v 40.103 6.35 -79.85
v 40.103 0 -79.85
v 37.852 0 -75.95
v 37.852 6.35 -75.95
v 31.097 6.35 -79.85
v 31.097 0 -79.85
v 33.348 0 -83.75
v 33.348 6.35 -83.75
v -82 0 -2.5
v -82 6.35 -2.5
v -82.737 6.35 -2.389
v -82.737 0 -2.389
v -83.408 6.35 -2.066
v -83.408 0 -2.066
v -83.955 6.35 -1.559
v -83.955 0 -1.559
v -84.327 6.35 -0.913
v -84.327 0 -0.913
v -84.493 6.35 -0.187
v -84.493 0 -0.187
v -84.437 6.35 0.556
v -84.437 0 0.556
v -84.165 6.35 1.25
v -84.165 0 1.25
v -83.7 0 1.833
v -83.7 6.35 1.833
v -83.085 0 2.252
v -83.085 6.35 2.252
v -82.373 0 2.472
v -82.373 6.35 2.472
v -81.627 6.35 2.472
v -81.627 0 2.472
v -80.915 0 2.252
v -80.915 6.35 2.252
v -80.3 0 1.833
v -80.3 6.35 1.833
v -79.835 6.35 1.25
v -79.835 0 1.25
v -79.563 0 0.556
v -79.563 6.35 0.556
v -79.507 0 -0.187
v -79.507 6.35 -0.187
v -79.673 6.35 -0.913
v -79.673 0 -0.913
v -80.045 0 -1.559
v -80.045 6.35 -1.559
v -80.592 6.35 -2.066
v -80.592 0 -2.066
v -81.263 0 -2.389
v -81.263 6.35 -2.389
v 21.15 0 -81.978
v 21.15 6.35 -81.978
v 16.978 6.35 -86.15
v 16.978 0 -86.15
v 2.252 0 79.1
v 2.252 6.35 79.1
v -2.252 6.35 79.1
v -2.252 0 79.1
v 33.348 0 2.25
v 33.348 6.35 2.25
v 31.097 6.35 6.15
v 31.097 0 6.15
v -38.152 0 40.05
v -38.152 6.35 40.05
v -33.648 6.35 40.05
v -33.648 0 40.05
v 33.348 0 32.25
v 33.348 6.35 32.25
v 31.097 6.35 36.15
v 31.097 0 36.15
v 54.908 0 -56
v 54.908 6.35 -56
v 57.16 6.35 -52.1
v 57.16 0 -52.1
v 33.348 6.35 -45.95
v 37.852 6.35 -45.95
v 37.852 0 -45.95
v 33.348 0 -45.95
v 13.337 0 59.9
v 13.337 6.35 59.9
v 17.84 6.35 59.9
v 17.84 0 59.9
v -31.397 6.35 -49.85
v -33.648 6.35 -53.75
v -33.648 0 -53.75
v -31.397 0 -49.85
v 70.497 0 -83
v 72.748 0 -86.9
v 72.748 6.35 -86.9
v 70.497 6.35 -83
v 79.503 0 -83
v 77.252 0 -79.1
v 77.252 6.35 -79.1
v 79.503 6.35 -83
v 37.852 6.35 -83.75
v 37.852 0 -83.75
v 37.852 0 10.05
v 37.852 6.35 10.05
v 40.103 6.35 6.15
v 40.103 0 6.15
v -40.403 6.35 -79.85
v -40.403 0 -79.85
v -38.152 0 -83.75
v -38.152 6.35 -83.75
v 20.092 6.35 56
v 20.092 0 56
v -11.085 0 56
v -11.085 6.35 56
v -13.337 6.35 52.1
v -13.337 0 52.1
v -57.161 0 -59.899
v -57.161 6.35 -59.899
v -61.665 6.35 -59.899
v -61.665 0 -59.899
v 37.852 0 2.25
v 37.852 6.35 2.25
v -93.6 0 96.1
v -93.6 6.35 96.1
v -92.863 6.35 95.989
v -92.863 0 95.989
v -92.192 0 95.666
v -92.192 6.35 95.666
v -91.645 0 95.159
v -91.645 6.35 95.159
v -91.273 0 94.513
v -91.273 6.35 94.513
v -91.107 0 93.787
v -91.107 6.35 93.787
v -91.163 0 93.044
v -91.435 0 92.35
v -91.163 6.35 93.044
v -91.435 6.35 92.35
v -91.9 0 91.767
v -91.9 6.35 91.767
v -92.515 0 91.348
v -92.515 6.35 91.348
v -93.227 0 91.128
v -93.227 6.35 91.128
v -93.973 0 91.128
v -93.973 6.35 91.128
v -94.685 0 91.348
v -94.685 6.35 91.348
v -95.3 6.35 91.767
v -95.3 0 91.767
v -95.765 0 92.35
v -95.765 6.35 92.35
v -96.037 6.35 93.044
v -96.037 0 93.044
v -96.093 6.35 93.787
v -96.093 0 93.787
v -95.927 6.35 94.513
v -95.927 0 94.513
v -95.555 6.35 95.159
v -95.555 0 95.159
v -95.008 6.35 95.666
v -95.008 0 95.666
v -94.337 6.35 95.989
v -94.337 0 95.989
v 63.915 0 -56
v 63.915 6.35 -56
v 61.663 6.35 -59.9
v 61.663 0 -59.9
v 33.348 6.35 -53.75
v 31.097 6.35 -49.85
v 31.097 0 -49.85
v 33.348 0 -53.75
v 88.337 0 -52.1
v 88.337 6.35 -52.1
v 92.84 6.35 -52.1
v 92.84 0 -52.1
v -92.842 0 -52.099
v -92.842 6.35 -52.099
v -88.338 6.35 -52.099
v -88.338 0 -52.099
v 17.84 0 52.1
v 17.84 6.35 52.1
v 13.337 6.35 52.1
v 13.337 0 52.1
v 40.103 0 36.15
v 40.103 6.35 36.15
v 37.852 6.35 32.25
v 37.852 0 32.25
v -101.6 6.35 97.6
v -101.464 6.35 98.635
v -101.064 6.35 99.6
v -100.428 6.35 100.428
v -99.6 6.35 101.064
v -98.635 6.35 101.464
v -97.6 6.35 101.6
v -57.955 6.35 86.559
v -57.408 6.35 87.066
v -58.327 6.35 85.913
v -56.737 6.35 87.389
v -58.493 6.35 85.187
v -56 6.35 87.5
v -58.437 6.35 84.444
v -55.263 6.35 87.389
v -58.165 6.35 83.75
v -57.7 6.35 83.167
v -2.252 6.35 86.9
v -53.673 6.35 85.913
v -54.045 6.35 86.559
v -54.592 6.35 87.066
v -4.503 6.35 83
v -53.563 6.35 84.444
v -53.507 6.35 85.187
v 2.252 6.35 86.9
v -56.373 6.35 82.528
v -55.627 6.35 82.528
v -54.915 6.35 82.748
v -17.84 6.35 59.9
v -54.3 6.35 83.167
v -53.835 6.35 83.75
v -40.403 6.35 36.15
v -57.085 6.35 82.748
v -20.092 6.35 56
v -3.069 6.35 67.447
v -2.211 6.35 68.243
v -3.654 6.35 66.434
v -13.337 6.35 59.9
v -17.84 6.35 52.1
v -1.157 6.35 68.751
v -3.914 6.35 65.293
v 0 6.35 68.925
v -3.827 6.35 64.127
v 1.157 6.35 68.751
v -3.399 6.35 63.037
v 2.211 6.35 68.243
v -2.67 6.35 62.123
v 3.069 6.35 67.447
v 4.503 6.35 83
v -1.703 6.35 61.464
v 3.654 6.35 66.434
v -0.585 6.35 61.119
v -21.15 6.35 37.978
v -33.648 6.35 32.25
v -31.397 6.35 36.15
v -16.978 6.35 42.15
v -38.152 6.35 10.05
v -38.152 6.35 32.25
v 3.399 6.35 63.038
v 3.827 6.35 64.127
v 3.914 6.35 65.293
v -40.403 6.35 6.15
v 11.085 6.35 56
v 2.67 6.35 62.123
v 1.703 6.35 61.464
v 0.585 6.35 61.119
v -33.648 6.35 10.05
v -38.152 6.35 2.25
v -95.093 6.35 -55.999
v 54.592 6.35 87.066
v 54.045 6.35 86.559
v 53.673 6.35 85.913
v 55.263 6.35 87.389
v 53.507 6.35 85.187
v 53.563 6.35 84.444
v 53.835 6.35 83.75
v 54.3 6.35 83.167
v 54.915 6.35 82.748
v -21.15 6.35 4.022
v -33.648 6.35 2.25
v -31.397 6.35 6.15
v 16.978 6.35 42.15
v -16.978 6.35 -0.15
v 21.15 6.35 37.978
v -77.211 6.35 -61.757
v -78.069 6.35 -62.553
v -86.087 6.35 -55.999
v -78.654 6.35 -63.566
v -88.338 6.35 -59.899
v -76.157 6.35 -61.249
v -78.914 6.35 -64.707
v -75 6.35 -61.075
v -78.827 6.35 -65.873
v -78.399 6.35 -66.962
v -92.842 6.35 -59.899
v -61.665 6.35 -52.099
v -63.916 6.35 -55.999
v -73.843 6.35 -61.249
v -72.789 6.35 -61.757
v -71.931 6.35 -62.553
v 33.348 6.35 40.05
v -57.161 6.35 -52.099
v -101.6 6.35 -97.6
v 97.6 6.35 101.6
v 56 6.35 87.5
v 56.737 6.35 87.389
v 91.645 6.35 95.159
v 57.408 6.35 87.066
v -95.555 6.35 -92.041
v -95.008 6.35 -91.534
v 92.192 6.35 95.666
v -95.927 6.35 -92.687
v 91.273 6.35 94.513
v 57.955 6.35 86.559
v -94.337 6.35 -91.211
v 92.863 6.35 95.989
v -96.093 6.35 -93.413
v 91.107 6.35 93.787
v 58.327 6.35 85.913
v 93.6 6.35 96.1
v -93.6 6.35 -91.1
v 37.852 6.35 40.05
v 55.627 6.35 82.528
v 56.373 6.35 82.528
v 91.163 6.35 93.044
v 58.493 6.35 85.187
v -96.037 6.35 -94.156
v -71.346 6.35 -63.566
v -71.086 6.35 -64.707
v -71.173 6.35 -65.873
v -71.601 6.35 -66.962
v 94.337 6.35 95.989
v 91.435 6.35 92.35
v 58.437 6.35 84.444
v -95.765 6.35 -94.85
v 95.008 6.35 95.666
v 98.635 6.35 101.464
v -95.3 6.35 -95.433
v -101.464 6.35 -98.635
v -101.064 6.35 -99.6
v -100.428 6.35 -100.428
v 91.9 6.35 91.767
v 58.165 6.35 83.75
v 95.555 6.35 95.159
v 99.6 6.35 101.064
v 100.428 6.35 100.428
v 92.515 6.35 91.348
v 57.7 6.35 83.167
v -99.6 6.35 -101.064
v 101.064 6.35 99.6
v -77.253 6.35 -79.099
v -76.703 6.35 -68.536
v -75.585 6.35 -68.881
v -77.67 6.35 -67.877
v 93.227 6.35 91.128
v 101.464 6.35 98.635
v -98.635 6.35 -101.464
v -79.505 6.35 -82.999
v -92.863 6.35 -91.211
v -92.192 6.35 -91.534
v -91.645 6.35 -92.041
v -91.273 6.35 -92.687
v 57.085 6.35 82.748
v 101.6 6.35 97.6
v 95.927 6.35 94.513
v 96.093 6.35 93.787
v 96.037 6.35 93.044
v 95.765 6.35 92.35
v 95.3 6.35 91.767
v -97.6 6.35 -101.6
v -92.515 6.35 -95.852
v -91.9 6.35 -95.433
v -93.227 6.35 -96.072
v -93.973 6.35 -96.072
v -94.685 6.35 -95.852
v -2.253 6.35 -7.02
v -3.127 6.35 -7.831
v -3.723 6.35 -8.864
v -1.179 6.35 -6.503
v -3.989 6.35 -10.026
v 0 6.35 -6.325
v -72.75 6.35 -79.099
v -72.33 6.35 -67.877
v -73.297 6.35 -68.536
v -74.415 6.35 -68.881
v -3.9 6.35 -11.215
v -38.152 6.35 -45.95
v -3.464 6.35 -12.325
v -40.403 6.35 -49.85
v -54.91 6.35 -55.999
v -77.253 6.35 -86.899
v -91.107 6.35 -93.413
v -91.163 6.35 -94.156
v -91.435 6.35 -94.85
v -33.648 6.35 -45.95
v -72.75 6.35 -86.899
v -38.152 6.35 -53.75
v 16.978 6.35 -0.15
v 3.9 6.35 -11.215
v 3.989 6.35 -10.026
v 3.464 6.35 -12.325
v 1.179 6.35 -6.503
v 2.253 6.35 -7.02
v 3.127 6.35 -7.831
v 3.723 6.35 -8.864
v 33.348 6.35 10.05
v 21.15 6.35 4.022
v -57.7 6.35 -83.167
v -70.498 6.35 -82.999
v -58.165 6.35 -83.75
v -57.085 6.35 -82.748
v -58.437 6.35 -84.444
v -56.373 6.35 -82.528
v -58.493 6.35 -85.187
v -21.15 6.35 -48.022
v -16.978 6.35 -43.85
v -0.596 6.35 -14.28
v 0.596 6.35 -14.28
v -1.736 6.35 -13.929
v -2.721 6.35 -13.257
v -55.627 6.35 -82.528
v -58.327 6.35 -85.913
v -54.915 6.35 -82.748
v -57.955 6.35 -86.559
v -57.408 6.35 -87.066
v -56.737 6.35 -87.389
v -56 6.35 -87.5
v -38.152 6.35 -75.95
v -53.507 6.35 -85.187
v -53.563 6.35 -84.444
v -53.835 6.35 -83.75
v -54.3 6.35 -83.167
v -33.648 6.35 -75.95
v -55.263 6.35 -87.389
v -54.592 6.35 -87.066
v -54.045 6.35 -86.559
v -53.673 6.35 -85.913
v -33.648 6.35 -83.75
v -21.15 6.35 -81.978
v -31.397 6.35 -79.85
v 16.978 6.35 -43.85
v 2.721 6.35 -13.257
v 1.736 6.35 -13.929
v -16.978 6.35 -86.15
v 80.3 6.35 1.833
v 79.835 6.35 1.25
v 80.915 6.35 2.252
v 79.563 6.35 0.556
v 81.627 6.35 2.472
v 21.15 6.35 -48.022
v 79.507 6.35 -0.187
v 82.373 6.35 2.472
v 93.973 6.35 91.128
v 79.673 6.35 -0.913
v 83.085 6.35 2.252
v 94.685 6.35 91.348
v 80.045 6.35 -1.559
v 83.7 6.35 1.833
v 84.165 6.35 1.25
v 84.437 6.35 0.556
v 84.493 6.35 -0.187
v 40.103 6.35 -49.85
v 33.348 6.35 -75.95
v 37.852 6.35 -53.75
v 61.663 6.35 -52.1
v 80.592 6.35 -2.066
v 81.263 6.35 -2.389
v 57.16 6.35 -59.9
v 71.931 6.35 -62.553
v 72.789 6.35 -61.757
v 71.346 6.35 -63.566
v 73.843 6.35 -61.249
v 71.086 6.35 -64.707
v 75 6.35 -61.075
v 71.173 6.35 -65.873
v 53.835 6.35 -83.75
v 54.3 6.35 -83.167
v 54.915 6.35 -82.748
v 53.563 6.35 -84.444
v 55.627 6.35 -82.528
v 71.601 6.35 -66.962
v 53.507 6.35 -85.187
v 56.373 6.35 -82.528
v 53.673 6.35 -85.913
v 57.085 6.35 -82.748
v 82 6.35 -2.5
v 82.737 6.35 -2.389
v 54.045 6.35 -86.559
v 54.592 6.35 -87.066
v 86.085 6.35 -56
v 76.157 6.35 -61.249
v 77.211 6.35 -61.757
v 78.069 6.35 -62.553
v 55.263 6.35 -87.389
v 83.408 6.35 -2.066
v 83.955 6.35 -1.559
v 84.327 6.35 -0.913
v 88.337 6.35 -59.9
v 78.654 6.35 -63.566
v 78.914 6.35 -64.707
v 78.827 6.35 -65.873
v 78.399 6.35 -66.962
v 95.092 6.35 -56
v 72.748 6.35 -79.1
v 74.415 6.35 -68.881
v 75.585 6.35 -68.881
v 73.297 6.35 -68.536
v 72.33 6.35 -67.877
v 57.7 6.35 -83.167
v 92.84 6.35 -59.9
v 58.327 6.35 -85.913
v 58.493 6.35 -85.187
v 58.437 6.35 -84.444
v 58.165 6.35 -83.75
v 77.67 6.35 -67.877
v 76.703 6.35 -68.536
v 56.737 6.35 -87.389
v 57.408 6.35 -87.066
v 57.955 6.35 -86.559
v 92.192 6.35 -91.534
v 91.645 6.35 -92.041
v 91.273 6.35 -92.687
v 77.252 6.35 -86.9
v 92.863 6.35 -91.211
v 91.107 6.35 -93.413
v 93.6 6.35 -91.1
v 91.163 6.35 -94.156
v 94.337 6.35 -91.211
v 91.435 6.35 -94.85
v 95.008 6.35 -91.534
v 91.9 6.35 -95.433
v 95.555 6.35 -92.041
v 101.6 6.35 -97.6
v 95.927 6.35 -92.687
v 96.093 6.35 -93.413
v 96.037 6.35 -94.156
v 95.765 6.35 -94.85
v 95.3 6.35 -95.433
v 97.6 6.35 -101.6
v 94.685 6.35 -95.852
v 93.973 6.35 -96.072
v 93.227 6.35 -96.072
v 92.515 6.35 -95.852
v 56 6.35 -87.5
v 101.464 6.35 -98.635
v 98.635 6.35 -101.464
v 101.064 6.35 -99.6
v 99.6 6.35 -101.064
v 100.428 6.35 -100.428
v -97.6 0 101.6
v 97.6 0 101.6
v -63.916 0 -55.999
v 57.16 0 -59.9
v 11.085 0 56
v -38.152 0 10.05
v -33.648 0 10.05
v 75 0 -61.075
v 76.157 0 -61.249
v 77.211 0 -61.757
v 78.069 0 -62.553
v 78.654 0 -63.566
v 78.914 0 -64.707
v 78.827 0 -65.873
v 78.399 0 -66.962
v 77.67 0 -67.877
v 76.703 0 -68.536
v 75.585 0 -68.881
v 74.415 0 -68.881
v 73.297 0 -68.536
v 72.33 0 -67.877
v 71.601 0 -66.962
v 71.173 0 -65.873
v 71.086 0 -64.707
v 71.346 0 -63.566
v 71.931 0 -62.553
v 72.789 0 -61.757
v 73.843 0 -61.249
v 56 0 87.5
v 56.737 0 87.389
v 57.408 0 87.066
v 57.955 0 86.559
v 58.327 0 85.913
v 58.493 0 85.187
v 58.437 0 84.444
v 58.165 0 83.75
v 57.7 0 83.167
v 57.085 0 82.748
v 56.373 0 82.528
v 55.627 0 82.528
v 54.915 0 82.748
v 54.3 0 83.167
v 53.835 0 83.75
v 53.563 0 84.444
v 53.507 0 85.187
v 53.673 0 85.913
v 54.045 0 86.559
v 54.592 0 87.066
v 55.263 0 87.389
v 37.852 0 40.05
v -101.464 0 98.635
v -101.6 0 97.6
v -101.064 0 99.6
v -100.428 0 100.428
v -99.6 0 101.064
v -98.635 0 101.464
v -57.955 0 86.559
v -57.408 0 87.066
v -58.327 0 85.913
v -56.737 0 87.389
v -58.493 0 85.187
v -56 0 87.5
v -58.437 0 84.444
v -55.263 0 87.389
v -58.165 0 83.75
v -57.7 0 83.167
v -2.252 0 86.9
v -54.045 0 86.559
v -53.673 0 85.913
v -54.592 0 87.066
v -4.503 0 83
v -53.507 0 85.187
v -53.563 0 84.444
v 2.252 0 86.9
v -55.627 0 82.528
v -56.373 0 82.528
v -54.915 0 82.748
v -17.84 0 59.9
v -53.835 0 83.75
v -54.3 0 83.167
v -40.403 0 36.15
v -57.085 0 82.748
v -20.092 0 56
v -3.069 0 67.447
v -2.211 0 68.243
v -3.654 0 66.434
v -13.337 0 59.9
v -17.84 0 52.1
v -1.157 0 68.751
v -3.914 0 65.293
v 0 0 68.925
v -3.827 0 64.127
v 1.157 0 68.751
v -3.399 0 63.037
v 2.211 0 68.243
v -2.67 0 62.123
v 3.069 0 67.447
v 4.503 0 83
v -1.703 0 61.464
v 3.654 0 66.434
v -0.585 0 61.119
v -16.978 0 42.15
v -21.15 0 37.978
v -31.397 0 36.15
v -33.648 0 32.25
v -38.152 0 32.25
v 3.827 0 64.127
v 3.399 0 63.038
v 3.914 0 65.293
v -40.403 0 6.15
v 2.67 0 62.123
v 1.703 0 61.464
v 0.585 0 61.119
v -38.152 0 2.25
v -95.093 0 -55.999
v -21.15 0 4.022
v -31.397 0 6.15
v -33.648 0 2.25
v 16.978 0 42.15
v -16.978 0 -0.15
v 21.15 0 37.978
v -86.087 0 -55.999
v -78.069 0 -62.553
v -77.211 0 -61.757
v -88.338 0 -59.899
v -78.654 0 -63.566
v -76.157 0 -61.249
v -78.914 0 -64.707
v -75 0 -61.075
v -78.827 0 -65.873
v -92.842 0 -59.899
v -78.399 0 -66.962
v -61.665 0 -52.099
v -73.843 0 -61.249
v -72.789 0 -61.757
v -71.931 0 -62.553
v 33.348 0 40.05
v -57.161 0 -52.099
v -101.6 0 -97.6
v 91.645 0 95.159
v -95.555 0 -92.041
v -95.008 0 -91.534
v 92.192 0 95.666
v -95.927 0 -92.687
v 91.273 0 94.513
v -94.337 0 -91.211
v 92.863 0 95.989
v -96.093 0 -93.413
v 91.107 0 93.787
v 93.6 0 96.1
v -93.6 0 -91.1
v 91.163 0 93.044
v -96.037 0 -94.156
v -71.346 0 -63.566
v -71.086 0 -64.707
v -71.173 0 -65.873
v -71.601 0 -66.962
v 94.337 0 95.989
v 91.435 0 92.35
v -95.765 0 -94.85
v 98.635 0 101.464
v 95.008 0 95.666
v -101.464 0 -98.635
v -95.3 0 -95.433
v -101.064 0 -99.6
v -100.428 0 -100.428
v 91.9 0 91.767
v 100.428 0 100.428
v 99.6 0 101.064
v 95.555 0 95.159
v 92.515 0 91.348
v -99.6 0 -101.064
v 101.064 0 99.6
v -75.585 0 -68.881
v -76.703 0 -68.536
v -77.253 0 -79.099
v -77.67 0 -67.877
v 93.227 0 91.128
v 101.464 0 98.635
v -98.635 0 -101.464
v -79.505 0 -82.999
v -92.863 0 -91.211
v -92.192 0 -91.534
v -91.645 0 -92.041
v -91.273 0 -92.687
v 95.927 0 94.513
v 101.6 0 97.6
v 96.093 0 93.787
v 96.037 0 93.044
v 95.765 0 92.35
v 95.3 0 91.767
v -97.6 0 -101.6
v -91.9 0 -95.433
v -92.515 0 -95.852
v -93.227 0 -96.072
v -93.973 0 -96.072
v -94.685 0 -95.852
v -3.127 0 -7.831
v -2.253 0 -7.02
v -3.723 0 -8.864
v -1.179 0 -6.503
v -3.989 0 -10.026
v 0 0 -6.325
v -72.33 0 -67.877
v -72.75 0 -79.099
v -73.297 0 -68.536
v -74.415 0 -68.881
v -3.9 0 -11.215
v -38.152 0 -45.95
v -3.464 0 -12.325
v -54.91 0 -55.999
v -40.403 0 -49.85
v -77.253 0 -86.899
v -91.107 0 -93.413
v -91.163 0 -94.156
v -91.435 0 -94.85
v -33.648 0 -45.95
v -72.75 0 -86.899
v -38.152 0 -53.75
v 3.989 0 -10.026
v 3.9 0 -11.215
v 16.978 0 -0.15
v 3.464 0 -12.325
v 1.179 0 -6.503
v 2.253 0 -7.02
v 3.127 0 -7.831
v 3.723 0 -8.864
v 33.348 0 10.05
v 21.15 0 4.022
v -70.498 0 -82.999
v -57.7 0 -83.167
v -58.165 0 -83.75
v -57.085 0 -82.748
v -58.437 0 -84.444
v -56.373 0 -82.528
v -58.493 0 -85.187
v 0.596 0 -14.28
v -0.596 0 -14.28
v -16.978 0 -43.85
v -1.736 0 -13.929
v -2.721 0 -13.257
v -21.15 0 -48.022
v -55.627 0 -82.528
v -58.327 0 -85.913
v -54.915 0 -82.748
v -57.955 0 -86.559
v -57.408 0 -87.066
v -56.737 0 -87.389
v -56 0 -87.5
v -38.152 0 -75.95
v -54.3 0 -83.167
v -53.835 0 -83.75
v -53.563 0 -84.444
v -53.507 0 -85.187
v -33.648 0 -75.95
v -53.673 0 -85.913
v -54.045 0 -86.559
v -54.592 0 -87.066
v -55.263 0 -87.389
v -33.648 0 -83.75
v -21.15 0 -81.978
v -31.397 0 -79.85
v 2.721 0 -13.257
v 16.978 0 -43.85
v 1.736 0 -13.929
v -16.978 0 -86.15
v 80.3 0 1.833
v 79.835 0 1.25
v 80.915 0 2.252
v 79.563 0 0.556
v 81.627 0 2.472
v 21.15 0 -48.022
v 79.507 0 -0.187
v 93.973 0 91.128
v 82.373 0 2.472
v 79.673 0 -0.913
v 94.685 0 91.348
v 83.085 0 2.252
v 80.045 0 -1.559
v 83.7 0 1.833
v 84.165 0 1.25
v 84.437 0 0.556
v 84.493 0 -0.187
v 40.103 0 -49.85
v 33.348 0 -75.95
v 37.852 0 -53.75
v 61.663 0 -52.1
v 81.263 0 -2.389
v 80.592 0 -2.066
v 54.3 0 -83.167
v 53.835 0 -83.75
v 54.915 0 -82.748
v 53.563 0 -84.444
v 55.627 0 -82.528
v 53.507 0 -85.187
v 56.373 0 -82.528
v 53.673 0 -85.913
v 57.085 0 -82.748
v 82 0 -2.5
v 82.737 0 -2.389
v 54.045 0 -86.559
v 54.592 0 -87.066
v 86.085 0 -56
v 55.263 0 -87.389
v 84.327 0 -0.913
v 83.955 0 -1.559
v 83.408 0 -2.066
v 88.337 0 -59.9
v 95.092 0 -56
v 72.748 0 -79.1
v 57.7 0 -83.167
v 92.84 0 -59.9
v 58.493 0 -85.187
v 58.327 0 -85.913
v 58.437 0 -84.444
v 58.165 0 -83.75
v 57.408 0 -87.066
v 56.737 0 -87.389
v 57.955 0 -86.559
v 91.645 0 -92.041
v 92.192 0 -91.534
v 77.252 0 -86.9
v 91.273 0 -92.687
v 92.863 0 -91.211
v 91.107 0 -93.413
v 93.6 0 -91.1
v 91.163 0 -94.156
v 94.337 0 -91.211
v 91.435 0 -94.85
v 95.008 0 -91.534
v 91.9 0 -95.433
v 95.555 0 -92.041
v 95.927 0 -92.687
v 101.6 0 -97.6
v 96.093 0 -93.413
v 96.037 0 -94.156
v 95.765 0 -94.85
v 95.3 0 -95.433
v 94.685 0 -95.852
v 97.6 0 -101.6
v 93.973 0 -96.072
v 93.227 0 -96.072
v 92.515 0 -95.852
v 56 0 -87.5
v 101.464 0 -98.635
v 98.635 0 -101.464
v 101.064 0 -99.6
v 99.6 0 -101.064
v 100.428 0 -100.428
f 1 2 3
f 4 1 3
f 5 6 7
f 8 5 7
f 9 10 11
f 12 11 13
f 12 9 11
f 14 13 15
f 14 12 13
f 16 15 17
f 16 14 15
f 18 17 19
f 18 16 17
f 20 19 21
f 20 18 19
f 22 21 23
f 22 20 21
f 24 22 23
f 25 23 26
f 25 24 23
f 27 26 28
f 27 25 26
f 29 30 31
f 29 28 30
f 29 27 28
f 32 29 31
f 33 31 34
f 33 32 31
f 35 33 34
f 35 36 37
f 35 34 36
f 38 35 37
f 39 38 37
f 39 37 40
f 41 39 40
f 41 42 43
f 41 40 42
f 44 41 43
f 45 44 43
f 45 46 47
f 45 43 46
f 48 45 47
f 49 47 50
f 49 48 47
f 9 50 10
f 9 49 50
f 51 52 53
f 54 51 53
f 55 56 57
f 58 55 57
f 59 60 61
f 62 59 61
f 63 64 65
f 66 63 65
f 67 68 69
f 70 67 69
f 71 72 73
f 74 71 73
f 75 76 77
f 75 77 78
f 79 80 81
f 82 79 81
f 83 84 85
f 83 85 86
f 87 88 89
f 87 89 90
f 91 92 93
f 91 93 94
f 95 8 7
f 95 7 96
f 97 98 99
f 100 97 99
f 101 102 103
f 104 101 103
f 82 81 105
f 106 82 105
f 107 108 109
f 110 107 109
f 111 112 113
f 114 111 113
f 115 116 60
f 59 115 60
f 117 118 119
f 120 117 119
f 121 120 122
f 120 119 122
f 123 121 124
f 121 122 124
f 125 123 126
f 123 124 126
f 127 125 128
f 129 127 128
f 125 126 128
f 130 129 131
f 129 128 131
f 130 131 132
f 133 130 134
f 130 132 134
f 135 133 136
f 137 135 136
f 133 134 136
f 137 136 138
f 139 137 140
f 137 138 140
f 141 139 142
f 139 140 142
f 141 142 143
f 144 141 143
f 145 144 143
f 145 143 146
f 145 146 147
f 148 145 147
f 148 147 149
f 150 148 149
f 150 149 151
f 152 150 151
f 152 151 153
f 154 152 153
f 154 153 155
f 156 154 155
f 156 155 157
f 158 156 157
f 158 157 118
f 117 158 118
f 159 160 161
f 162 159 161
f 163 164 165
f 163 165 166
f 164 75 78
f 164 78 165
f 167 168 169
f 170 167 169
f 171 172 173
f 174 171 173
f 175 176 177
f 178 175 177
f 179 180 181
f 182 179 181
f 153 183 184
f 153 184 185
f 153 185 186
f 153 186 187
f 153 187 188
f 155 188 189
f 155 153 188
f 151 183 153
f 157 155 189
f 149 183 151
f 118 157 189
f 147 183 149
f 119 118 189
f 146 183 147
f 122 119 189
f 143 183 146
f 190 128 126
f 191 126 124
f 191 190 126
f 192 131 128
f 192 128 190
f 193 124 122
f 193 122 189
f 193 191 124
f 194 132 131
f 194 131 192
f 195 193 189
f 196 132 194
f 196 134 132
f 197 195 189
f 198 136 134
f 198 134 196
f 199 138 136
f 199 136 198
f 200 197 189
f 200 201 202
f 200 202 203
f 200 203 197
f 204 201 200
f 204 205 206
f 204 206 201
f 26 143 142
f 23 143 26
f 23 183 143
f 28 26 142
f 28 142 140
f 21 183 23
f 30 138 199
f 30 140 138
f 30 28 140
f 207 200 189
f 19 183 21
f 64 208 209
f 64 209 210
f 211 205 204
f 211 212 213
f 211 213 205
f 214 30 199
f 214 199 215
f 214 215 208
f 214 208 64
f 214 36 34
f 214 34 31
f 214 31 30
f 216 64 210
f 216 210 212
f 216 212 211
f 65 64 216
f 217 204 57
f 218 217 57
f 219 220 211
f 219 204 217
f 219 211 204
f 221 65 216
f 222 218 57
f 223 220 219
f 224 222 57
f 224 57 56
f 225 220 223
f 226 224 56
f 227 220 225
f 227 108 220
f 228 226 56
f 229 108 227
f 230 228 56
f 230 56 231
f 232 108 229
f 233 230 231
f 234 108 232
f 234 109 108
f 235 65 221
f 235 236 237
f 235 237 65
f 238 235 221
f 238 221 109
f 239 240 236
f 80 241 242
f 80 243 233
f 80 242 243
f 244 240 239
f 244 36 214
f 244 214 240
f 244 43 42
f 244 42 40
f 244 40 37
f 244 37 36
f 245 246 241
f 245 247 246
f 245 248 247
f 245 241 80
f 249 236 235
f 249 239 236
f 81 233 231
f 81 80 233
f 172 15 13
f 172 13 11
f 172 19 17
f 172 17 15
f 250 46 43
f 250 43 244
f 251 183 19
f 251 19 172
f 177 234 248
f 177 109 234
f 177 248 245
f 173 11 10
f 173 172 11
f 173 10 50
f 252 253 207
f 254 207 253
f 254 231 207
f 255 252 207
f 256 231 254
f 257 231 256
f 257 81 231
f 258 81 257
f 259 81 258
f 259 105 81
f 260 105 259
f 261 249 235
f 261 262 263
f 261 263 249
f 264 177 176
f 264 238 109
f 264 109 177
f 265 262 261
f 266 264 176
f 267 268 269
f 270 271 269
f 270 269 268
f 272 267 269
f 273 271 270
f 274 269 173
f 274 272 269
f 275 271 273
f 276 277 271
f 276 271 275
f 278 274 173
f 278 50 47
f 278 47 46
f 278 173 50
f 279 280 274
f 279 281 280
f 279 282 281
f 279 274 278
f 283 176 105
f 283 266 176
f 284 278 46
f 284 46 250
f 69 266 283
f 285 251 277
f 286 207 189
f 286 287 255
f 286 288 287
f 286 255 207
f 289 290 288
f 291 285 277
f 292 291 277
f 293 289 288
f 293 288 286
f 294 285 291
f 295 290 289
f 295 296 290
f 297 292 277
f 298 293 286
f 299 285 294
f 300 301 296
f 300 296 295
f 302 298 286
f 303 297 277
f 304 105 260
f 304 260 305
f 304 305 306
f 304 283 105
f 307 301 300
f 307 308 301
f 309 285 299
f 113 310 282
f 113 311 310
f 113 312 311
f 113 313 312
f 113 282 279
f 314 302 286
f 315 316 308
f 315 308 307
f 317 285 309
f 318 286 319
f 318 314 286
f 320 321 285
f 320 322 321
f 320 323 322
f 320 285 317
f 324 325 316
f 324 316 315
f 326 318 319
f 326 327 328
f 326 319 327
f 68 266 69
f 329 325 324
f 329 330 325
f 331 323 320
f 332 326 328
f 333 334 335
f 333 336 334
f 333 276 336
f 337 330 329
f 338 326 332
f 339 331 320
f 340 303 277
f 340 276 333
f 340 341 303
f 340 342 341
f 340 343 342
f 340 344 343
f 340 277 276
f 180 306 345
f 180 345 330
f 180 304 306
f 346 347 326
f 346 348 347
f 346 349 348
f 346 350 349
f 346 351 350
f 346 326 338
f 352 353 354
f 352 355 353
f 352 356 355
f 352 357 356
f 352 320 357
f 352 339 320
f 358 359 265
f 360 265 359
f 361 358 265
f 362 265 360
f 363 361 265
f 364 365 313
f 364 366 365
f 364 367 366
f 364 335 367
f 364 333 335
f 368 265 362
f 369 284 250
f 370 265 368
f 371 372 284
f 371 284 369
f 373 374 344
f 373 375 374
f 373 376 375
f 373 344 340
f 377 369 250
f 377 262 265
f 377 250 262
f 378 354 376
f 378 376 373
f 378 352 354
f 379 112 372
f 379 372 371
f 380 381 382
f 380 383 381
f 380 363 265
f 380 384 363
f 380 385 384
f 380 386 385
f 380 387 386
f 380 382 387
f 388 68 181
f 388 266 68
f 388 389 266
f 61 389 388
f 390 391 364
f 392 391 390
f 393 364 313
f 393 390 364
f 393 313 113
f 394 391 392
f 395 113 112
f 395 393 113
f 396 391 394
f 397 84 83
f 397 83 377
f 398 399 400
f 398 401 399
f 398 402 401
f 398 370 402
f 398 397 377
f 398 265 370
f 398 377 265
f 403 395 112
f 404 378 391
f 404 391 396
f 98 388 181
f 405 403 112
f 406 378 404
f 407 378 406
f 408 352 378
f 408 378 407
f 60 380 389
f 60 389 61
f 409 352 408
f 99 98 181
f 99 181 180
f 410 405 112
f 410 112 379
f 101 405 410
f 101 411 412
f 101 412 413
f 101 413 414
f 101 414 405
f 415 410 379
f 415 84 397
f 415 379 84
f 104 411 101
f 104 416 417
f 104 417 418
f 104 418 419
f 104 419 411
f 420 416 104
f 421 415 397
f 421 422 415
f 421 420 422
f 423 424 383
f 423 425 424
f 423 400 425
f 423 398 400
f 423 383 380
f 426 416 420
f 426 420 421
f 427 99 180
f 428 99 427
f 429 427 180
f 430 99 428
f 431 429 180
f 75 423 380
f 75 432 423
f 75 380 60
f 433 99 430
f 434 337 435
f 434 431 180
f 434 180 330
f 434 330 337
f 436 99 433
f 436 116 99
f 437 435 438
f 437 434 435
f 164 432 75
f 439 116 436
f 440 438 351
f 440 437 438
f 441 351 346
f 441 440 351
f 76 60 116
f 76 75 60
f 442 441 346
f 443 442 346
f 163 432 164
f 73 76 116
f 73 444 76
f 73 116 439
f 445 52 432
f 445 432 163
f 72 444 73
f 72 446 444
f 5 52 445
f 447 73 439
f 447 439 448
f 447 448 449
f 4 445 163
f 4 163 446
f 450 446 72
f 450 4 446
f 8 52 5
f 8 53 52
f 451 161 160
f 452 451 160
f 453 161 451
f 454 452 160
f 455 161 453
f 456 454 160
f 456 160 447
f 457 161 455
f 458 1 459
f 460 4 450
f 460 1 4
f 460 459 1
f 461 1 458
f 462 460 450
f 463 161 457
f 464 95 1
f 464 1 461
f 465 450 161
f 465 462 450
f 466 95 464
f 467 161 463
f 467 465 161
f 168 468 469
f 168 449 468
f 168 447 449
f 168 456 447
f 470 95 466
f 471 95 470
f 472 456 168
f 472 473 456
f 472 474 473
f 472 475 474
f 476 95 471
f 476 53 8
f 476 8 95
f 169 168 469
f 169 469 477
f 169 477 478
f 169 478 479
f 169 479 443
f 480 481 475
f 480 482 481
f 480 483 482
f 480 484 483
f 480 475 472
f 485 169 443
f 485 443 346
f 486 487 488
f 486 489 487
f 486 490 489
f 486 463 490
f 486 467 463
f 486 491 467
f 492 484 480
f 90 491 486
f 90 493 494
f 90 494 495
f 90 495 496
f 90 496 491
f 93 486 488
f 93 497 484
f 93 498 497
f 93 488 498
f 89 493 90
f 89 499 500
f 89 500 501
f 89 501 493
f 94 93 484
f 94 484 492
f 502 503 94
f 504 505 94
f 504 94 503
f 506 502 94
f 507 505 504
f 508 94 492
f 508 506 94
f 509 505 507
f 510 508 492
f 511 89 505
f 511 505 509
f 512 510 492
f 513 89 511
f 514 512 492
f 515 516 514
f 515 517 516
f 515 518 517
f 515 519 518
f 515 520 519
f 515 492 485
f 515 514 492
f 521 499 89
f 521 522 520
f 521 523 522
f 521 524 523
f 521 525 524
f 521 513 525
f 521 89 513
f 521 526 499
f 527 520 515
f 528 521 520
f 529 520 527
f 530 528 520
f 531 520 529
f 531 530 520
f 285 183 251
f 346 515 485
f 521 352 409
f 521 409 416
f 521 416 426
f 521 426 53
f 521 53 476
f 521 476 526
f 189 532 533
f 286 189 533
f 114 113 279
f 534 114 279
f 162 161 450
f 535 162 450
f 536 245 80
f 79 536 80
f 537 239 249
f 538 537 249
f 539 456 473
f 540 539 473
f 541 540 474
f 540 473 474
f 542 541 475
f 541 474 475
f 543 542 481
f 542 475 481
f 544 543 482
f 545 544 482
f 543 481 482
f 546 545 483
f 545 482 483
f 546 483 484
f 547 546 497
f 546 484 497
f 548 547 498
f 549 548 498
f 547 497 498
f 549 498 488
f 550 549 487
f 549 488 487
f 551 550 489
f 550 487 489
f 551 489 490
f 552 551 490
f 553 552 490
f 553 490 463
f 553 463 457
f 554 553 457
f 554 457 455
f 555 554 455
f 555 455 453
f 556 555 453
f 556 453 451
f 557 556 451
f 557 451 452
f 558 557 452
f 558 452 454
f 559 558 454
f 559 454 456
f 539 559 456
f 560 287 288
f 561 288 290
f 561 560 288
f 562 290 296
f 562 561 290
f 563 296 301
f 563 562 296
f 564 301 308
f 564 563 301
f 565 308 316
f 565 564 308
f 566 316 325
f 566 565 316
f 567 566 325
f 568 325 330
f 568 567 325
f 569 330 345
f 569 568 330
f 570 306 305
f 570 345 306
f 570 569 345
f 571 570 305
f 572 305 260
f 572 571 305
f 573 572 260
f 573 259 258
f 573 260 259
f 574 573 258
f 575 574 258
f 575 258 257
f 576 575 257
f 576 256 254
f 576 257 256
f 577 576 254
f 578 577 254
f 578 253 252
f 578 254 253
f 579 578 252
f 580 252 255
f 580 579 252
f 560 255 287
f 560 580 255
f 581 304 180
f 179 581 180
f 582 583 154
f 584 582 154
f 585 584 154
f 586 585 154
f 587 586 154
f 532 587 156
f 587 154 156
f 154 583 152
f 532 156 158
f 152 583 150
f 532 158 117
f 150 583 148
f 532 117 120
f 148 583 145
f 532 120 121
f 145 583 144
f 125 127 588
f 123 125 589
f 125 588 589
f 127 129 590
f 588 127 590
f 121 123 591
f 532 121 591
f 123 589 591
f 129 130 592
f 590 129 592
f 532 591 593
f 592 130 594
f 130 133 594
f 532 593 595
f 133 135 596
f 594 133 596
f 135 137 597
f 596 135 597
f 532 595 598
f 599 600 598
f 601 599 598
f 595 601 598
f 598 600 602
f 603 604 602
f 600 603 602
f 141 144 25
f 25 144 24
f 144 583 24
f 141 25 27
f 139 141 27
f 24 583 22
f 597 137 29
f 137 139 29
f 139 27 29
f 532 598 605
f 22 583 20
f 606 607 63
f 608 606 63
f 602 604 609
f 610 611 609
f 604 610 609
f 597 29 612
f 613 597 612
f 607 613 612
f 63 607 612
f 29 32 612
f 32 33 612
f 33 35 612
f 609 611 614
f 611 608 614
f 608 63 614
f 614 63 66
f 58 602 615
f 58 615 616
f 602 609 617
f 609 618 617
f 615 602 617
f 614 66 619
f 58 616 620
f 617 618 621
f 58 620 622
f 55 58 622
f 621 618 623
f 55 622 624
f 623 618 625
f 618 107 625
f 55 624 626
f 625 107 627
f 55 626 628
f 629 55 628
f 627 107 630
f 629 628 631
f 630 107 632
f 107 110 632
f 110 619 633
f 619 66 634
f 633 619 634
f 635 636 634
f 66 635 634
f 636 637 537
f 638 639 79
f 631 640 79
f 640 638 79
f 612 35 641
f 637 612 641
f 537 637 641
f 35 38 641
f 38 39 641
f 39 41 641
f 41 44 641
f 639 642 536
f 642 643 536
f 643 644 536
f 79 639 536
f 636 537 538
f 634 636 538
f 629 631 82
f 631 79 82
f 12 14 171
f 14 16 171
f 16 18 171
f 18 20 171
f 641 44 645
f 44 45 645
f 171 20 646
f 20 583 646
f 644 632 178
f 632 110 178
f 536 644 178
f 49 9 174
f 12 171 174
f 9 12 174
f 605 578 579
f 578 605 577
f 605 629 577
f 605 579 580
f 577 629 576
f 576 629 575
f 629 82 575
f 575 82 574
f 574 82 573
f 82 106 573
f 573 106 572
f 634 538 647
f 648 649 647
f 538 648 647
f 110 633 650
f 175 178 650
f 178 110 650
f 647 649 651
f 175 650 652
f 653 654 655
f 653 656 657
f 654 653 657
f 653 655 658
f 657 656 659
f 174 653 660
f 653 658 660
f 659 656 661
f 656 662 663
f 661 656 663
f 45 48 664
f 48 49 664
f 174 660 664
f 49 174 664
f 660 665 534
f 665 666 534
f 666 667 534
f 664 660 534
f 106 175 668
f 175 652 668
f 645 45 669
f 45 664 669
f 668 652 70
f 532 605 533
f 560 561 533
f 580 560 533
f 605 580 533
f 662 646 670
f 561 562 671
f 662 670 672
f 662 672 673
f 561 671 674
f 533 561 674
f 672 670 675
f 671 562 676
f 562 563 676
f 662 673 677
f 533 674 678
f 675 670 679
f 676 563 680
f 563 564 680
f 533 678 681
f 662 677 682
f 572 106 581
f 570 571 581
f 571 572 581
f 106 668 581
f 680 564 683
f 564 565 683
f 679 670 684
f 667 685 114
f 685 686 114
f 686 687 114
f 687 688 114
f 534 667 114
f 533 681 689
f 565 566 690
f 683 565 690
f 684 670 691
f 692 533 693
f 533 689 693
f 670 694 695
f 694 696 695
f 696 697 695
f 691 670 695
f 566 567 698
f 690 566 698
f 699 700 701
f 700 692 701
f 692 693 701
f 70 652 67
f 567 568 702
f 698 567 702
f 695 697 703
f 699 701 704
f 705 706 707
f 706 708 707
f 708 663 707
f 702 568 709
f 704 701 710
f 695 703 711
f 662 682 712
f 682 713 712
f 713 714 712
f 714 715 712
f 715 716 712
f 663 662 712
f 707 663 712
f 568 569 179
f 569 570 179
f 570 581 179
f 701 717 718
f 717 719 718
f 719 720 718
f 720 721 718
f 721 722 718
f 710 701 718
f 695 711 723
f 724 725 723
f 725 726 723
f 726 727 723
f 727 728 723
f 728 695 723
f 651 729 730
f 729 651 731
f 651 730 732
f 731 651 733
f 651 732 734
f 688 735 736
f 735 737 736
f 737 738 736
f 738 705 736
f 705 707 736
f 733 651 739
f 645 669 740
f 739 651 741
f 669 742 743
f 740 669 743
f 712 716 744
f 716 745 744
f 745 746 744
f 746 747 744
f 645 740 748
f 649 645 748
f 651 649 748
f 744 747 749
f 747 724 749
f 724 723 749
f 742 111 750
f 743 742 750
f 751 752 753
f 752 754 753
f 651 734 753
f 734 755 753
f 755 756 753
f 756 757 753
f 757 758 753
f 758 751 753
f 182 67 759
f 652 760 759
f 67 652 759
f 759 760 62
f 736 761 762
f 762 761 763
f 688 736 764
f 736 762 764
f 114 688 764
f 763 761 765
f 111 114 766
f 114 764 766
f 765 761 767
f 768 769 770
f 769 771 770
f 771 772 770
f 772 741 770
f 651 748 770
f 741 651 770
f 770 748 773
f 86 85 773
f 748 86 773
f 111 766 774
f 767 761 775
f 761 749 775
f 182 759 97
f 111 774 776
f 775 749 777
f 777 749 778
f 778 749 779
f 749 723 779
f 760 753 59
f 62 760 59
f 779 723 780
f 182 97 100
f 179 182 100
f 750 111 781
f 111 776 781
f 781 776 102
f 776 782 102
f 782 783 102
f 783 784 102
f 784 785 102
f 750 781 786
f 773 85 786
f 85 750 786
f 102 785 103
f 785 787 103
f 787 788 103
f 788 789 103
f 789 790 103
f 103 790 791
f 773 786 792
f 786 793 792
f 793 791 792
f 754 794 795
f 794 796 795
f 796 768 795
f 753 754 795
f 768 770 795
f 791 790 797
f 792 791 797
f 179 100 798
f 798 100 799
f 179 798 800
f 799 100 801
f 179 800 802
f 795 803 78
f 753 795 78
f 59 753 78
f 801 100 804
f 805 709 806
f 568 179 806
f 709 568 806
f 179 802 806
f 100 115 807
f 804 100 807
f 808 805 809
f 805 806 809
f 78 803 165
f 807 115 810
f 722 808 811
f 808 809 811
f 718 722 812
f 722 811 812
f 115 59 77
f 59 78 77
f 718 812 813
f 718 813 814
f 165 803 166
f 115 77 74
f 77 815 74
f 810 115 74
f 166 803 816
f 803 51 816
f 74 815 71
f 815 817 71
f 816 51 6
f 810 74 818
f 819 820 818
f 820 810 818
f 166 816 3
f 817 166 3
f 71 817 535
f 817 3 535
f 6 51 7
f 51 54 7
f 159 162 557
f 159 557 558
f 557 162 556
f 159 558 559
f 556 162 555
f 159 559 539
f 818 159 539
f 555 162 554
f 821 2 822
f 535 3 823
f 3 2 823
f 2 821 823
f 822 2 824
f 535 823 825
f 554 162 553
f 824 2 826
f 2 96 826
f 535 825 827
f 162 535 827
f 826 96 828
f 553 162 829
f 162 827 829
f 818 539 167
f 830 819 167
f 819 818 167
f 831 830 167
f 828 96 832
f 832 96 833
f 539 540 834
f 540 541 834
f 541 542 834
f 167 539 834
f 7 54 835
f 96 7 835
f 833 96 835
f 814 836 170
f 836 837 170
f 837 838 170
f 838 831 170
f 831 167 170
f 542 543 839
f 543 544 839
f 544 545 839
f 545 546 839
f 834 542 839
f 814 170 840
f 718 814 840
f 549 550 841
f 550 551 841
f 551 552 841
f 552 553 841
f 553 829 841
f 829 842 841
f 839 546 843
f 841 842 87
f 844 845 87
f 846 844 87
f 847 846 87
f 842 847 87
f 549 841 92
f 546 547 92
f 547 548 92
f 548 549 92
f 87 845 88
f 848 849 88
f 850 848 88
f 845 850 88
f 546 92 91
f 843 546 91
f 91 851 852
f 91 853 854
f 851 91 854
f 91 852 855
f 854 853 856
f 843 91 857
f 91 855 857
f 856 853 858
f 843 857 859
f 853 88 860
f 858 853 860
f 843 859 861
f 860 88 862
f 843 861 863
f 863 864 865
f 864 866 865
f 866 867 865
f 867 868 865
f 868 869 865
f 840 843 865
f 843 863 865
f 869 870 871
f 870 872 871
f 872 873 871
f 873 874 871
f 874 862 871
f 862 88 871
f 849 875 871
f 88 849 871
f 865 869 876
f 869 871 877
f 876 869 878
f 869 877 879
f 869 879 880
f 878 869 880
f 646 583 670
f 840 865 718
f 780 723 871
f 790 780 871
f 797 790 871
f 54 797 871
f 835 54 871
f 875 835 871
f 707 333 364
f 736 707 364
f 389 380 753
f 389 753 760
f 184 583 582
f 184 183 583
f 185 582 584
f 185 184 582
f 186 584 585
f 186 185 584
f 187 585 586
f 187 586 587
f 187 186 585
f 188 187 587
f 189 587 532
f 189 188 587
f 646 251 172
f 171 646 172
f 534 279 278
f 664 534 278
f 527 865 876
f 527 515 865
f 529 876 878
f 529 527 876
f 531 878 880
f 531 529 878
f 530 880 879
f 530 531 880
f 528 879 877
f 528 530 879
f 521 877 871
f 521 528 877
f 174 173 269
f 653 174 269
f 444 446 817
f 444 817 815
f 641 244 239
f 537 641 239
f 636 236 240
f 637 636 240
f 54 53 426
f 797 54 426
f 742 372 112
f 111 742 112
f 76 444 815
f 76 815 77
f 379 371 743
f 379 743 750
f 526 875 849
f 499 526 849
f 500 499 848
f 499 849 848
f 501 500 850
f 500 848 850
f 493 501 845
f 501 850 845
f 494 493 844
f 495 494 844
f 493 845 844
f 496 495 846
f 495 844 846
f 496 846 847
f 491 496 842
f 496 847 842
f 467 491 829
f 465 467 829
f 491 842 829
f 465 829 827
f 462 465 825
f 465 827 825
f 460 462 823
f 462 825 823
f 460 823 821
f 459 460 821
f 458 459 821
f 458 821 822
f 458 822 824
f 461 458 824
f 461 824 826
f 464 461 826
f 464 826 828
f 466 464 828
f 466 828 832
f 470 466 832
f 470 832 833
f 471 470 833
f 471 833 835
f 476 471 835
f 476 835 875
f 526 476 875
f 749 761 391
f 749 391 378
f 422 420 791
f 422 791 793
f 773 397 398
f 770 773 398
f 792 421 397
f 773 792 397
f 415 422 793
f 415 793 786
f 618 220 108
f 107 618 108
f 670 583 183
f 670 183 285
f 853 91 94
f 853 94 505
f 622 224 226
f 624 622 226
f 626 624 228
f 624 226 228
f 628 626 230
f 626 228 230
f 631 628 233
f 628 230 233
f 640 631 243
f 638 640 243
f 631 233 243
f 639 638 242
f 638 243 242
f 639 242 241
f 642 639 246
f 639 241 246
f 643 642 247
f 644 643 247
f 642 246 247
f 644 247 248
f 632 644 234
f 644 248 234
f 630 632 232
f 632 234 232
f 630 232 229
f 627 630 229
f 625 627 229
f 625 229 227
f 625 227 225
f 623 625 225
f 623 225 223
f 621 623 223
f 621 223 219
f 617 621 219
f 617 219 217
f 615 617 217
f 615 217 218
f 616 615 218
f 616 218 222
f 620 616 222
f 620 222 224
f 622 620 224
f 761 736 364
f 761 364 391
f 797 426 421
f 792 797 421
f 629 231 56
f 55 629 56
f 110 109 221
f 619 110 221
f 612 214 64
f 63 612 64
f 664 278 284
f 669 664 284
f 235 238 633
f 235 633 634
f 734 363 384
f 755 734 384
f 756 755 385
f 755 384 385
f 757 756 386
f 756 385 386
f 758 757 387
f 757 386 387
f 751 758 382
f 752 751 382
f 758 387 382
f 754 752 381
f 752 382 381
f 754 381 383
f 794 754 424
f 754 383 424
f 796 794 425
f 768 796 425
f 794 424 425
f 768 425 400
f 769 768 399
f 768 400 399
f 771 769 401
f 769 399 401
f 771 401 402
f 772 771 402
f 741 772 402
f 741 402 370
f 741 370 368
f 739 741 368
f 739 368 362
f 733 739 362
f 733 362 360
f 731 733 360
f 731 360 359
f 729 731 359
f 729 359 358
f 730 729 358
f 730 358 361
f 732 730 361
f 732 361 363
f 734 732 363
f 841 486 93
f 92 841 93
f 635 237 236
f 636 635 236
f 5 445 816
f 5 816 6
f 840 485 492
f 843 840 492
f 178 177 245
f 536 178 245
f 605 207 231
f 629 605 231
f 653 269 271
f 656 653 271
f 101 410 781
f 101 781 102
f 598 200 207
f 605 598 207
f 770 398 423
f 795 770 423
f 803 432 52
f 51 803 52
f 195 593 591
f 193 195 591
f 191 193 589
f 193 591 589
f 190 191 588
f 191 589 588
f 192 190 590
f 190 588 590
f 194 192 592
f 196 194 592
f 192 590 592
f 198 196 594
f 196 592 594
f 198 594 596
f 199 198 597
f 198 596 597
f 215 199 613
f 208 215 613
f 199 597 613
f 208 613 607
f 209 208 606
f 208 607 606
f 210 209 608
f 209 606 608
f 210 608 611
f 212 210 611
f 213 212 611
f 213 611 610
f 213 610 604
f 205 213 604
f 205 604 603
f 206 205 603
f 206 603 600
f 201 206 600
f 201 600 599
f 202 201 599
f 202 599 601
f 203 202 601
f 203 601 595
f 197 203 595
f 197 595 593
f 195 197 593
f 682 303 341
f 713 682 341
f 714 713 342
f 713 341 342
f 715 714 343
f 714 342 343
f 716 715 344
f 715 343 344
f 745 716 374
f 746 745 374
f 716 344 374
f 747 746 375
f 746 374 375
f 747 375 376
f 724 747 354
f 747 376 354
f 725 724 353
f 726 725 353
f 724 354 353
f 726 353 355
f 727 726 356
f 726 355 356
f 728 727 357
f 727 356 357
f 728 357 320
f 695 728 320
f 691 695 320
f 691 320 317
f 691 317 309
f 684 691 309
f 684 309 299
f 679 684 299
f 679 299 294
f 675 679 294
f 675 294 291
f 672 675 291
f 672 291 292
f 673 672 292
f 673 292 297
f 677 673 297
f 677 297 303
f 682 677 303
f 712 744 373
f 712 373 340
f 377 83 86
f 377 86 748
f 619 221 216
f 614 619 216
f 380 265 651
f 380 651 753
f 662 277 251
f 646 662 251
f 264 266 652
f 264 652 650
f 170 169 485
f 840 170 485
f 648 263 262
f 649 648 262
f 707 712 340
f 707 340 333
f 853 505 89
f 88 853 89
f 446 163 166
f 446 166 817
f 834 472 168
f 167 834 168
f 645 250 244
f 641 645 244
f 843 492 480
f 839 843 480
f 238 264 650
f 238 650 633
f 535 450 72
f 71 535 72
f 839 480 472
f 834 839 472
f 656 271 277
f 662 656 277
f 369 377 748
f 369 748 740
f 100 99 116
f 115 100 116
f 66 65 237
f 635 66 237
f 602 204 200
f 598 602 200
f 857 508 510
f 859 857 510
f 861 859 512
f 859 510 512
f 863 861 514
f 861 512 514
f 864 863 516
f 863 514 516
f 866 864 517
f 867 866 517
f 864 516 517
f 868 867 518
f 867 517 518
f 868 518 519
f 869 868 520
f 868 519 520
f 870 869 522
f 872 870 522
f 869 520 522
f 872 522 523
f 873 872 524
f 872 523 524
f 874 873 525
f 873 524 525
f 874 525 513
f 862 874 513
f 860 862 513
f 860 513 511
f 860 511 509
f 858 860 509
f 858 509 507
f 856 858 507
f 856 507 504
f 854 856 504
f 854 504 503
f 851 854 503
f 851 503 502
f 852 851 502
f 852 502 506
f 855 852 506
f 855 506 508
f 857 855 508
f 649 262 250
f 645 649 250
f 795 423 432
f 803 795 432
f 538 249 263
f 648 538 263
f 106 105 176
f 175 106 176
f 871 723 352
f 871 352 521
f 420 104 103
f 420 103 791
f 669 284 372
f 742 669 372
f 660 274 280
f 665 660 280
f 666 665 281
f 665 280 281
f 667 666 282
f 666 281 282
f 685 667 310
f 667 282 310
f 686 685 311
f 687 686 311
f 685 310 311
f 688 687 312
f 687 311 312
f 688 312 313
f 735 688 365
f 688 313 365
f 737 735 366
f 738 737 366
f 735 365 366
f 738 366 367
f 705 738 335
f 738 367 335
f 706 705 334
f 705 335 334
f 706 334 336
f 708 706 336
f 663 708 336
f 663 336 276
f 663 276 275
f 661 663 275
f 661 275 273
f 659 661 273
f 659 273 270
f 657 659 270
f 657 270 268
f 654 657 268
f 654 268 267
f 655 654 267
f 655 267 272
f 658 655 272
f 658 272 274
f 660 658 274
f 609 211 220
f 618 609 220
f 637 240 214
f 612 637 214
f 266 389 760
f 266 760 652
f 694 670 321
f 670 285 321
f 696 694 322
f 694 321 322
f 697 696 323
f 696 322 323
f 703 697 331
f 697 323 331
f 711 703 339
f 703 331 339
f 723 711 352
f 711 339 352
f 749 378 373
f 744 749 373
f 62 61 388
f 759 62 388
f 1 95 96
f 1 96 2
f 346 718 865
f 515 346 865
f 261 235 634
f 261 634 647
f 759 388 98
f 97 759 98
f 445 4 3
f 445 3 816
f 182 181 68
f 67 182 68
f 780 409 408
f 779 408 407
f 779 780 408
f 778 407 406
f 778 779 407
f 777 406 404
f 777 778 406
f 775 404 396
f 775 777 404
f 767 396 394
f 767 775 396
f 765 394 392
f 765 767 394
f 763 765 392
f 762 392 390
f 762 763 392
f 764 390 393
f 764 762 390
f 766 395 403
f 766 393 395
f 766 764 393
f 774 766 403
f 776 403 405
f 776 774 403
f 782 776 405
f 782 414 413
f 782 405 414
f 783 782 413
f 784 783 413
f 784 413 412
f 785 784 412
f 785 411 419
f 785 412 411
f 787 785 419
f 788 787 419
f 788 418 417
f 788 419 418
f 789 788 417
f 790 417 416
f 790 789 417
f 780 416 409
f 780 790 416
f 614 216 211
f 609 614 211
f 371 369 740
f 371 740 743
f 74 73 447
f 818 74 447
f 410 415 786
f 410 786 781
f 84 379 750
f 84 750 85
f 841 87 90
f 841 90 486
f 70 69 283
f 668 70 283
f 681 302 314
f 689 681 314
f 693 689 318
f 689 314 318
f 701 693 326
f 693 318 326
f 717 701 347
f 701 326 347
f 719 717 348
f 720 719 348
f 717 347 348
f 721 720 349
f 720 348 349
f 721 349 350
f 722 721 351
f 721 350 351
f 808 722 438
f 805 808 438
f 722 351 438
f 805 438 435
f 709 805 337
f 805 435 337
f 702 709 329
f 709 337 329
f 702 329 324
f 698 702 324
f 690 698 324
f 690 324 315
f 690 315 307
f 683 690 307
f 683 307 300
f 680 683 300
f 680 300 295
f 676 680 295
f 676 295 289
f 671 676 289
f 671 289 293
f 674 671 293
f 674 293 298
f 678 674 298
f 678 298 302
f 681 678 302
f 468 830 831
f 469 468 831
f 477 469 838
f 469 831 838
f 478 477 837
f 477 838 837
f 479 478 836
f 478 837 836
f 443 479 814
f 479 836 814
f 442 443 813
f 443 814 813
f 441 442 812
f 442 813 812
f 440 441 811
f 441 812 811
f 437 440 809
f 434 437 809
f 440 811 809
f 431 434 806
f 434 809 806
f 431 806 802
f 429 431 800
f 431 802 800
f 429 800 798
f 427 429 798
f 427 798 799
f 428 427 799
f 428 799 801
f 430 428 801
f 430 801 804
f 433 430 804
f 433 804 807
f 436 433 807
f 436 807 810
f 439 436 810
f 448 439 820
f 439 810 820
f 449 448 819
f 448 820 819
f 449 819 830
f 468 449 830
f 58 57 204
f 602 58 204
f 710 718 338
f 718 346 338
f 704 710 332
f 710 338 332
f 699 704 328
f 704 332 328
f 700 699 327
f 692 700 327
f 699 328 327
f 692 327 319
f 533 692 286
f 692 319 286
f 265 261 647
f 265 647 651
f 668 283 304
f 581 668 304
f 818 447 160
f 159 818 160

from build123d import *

# Parameters (mm, degrees)
ESQUISSE1_W               = 203.2
ESQUISSE1_H               = 203.2
BOSS_EXTRU_1_DEPTH        = 6.35
ESQUISSE2_R               = 3.925
ENL_V_MAT_EXTRU_1_DEPTH   = 144.824345992
ENL_V_MAT_EXTRU_2_DEPTH   = 144.824345992
ENL_V_MAT_EXTRU_5_DEPTH   = 144.824345992
ENL_V_MAT_EXTRU_6_DEPTH   = 144.824345992
ENL_V_MAT_EXTRU_7_DEPTH   = 144.824345992
ENL_V_MAT_EXTRU_8_DEPTH   = 144.824345992
ENL_V_MAT_EXTRU_9_DEPTH   = 144.824345992
ESQUISSE11_R              = 2.5
ENL_V_MAT_EXTRU_10_DEPTH  = 144.824345992
ESQUISSE12_R              = 4
ENL_V_MAT_EXTRU_11_DEPTH  = 144.824345992
ESQUISSE13_R              = 2.5
ENL_V_MAT_EXTRU_12_DEPTH  = 144.824345992
SYM_TRIE2_COPY_1_SKETCH_R = 2.5
SYM_TRIE2_COPY_1_DEPTH    = 144.824345992
CONG_3_R                  = 4
ENL_V_MAT_EXTRU_13_DEPTH  = 144.824345992
ESQUISSE15_R              = 2.6
ENL_V_MAT_EXTRU_14_DEPTH  = 144.824345992
ENL_V_MAT_EXTRU_15_DEPTH  = 144.824345992


with BuildPart() as part:
    # Esquisse1 → Boss.-Extru.1 (new body)
    with BuildSketch(Plane(origin=(0, 0, 0), x_dir=(1, 0, 0), z_dir=(0, 1, 0))):
        Rectangle(ESQUISSE1_W, ESQUISSE1_H)
    extrude(amount=BOSS_EXTRU_1_DEPTH)

    # Esquisse2 → Enlèv. mat.-Extru.1 (cut, through all)
    with BuildSketch(Plane(origin=(0, 6.35, 0), x_dir=(1, 0, 0), z_dir=(0, 1, 0))):
        with Locations(Location((-75, 65, 0), (0, 0, 270))):
            Circle(ESQUISSE2_R)
        with Locations(Location((75, 65, 0), (0, 0, 270))):
            Circle(ESQUISSE2_R)
        with Locations(Location((0, -65, 0), (0, 0, 270))):
            Circle(ESQUISSE2_R)
    extrude(amount=-ENL_V_MAT_EXTRU_1_DEPTH, mode=Mode.SUBTRACT)

    # Esquisse3 → Enlèv. mat.-Extru.2 (cut, through all)
    with BuildSketch(Plane(origin=(0, 6.35, 0), x_dir=(1, 0, 0), z_dir=(0, 1, 0))):
        Polygon((-16.978069991, 86.15), (-21.15, 81.978069991), (-21.15, 48.021930009), (-16.978069991, 43.85), (16.978069991, 43.85), (21.15, 48.021930009), (21.15, 81.978069991), (16.978069991, 86.15), align=None)
    extrude(amount=-ENL_V_MAT_EXTRU_2_DEPTH, mode=Mode.SUBTRACT)

    # Esquisse5 → Enlèv. mat.-Extru.5 (cut, through all)
    with BuildSketch(Plane(origin=(0, 6.35, 0), x_dir=(1, 0, 0), z_dir=(0, 1, 0))):
        Polygon((-31.3966679, 49.85), (-33.64833395, 45.95), (-38.15166605, 45.95), (-40.4033321, 49.85), (-38.15166605, 53.75), (-33.64833395, 53.75), align=None)
    extrude(amount=-ENL_V_MAT_EXTRU_5_DEPTH, mode=Mode.SUBTRACT)

    # Esquisse7 → Enlèv. mat.-Extru.6 (cut, through all)
    with BuildSketch(Plane(origin=(0, 6.35, 0), x_dir=(1, 0, 0), z_dir=(0, 1, 0))):
        Polygon((-33.64833395, 75.95), (-38.15166605, 75.95), (-40.4033321, 79.85), (-38.15166605, 83.75), (-33.64833395, 83.75), (-31.3966679, 79.85), align=None)
    extrude(amount=-ENL_V_MAT_EXTRU_6_DEPTH, mode=Mode.SUBTRACT)

    # Esquisse8 → Enlèv. mat.-Extru.7 (cut, through all)
    with BuildSketch(Plane(origin=(0, 6.35, 0), x_dir=(1, 0, 0), z_dir=(0, 1, 0))):
        Polygon((37.85166605, 45.95), (33.34833395, 45.95), (31.0966679, 49.85), (33.34833395, 53.75), (37.85166605, 53.75), (40.1033321, 49.85), align=None)
    extrude(amount=-ENL_V_MAT_EXTRU_7_DEPTH, mode=Mode.SUBTRACT)

    # Esquisse9 → Enlèv. mat.-Extru.8 (cut, through all)
    with BuildSketch(Plane(origin=(0, 6.35, 0), x_dir=(1, 0, 0), z_dir=(0, 1, 0))):
        Polygon((37.85166605, 75.95), (33.34833395, 75.95), (31.0966679, 79.85), (33.34833395, 83.75), (37.85166605, 83.75), (40.1033321, 79.85), align=None)
    extrude(amount=-ENL_V_MAT_EXTRU_8_DEPTH, mode=Mode.SUBTRACT)

    # Esquisse10 → Enlèv. mat.-Extru.9 (cut, through all)
    with BuildSketch(Plane(origin=(0, 6.35, 0), x_dir=(1, 0, 0), z_dir=(0, 1, 0))):
        Polygon((-11.085125168, -56), (-13.336791218, -52.1), (-17.840123318, -52.1), (-20.091789368, -56), (-17.840123318, -59.9), (-13.336791218, -59.9), align=None)
        Polygon((11.085125168, -56), (13.336791218, -59.9), (17.840123318, -59.9), (20.091789368, -56), (17.840123318, -52.1), (13.336791218, -52.1), align=None)
        Polygon((-4.5033321, -83), (-2.25166605, -86.9), (2.25166605, -86.9), (4.5033321, -83), (2.25166605, -79.1), (-2.25166605, -79.1), align=None)
        Polygon((-63.916340686, 55.999154304), (-61.664674636, 52.099154304), (-57.161342537, 52.099154304), (-54.909676487, 55.999154304), (-57.161342537, 59.899154304), (-61.664674636, 59.899154304), align=None)
        Polygon((-95.093255222, 55.999154304), (-92.841589173, 52.099154304), (-88.338257073, 52.099154304), (-86.086591023, 55.999154304), (-88.338257073, 59.899154304), (-92.841589173, 59.899154304), align=None)
        Polygon((-79.504797954, 82.999154304), (-77.253131904, 79.099154304), (-72.749799805, 79.099154304), (-70.498133755, 82.999154304), (-72.749799805, 86.899154304), (-77.253131904, 86.899154304), align=None)
        Polygon((54.908210632, 56), (57.159876682, 52.1), (61.663208782, 52.1), (63.914874832, 56), (61.663208782, 59.9), (57.159876682, 59.9), align=None)
        Polygon((95.091789368, 56), (92.840123318, 59.9), (88.336791218, 59.9), (86.085125168, 56), (88.336791218, 52.1), (92.840123318, 52.1), align=None)
        Polygon((70.4966679, 83), (72.74833395, 79.1), (77.25166605, 79.1), (79.5033321, 83), (77.25166605, 86.9), (72.74833395, 86.9), align=None)
    extrude(amount=-ENL_V_MAT_EXTRU_9_DEPTH, mode=Mode.SUBTRACT)

    # Esquisse11 → Enlèv. mat.-Extru.10 (cut, through all)
    with BuildSketch(Plane(origin=(0, 6.35, 0), x_dir=(1, 0, 0), z_dir=(0, 1, 0))):
        with Locations(Location((93.6, 93.6, 0), (0, 0, 270))):
            Circle(ESQUISSE11_R)
        with Locations(Location((-93.6, 93.6, 0), (0, 0, 270))):
            Circle(ESQUISSE11_R)
        with Locations(Location((-93.6, -93.6, 0), (0, 0, 270))):
            Circle(ESQUISSE11_R)
        with Locations(Location((93.6, -93.6, 0), (0, 0, 270))):
            Circle(ESQUISSE11_R)
    extrude(amount=-ENL_V_MAT_EXTRU_10_DEPTH, mode=Mode.SUBTRACT)

    # Esquisse12 → Enlèv. mat.-Extru.11 (cut, through all)
    with BuildSketch(Plane(origin=(0, 6.35, 0), x_dir=(1, 0, 0), z_dir=(0, 1, 0))):
        with Locations(Location((0, 10.325, 0), (0, 0, 270))):
            Circle(ESQUISSE12_R)
    extrude(amount=-ENL_V_MAT_EXTRU_11_DEPTH, mode=Mode.SUBTRACT)

    # Esquisse13 → Enlèv. mat.-Extru.12 (cut, through all)
    with BuildSketch(Plane.XZ):
        with Locations(Location((56, -85, 0), (0, 0, 270))):
            Circle(ESQUISSE13_R)
        with Locations(Location((82, 0, 0), (0, 0, 270))):
            Circle(ESQUISSE13_R)
    enl_v_mat_extru_12 = extrude(amount=-ENL_V_MAT_EXTRU_12_DEPTH, mode=Mode.SUBTRACT)

    # Symétrie1: Enlèv. mat.-Extru.12 across plane
    add(enl_v_mat_extru_12.mirror(Plane.XY), mode=Mode.SUBTRACT)

    # Symétrie2: Enlèv. mat.-Extru.12 across plane
    add(enl_v_mat_extru_12.mirror(Plane(origin=(0, 0, 0), x_dir=(0, 0, 1), z_dir=(1, 0, 0))), mode=Mode.SUBTRACT)

    # Symétrie2 copy 1 sketch → Symétrie2 copy 1 (cut, through all)
    with BuildSketch(Plane(origin=(0, 0, 0), x_dir=(-1, 0, 0), z_dir=(0, -1, 0))):
        with Locations(Location((56, -85, 0), (0, 0, 270))):
            Circle(SYM_TRIE2_COPY_1_SKETCH_R)
        with Locations(Location((82, 0, 0), (0, 0, 270))):
            Circle(SYM_TRIE2_COPY_1_SKETCH_R)
    extrude(amount=-SYM_TRIE2_COPY_1_DEPTH, mode=Mode.SUBTRACT)

    # Congé3
    cong_3_edges = [part.edges().sort_by_distance(p)[0] for p in [
        (101.6, 3.175, 101.6),
        (-101.6, 3.175, 101.6),
        (-101.6, 3.175, -101.6),
        (101.6, 3.175, -101.6),
    ]]
    fillet(cong_3_edges, radius=CONG_3_R)

    # Esquisse14 → Enlèv. mat.-Extru.13 (cut, through all)
    with BuildSketch(Plane(origin=(0, 6.35, 0), x_dir=(1, 0, 0), z_dir=(0, 1, 0))):
        Polygon((16.978069991, -42.150000003), (-16.978069991, -42.150000003), (-21.15, -37.978069994), (-21.15, -4.021930012), (-16.978069991, 0.149999997), (16.978069991, 0.149999997), (21.15, -4.021930012), (21.15, -37.978069994), align=None)
    extrude(amount=-ENL_V_MAT_EXTRU_13_DEPTH, mode=Mode.SUBTRACT)

    # Esquisse15 → Enlèv. mat.-Extru.14 (cut, through all)
    with BuildSketch(Plane(origin=(0, 6.35, 0), x_dir=(1, 0, 0), z_dir=(0, 1, 0))):
        with Locations(Location((35.6, -36.15, 0), (0, 0, 270))):
            Circle(ESQUISSE15_R)
        with Locations(Location((35.6, -6.15, 0), (0, 0, 270))):
            Circle(ESQUISSE15_R)
        with Locations(Location((-35.9, -36.15, 0), (0, 0, 270))):
            Circle(ESQUISSE15_R)
        with Locations(Location((-35.9, -6.15, 0), (0, 0, 270))):
            Circle(ESQUISSE15_R)
    extrude(amount=-ENL_V_MAT_EXTRU_14_DEPTH, mode=Mode.SUBTRACT)

    # Esquisse16 → Enlèv. mat.-Extru.15 (cut, through all)
    with BuildSketch(Plane(origin=(0, 6.35, 0), x_dir=(1, 0, 0), z_dir=(0, 1, 0))):
        Polygon((31.0966679, -36.15), (33.34833395, -40.05), (37.85166605, -40.05), (40.1033321, -36.15), (37.85166605, -32.25), (33.34833395, -32.25), align=None)
        Polygon((31.0966679, -6.15), (33.34833395, -10.05), (37.85166605, -10.05), (40.1033321, -6.15), (37.85166605, -2.25), (33.34833395, -2.25), align=None)
        Polygon((-40.4033321, -6.15), (-38.15166605, -10.05), (-33.64833395, -10.05), (-31.3966679, -6.15), (-33.64833395, -2.25), (-38.15166605, -2.25), align=None)
        Polygon((-40.4033321, -36.15), (-38.15166605, -40.05), (-33.64833395, -40.05), (-31.3966679, -36.15), (-33.64833395, -32.25), (-38.15166605, -32.25), align=None)
    extrude(amount=-ENL_V_MAT_EXTRU_15_DEPTH, mode=Mode.SUBTRACT)


solid = part.part
